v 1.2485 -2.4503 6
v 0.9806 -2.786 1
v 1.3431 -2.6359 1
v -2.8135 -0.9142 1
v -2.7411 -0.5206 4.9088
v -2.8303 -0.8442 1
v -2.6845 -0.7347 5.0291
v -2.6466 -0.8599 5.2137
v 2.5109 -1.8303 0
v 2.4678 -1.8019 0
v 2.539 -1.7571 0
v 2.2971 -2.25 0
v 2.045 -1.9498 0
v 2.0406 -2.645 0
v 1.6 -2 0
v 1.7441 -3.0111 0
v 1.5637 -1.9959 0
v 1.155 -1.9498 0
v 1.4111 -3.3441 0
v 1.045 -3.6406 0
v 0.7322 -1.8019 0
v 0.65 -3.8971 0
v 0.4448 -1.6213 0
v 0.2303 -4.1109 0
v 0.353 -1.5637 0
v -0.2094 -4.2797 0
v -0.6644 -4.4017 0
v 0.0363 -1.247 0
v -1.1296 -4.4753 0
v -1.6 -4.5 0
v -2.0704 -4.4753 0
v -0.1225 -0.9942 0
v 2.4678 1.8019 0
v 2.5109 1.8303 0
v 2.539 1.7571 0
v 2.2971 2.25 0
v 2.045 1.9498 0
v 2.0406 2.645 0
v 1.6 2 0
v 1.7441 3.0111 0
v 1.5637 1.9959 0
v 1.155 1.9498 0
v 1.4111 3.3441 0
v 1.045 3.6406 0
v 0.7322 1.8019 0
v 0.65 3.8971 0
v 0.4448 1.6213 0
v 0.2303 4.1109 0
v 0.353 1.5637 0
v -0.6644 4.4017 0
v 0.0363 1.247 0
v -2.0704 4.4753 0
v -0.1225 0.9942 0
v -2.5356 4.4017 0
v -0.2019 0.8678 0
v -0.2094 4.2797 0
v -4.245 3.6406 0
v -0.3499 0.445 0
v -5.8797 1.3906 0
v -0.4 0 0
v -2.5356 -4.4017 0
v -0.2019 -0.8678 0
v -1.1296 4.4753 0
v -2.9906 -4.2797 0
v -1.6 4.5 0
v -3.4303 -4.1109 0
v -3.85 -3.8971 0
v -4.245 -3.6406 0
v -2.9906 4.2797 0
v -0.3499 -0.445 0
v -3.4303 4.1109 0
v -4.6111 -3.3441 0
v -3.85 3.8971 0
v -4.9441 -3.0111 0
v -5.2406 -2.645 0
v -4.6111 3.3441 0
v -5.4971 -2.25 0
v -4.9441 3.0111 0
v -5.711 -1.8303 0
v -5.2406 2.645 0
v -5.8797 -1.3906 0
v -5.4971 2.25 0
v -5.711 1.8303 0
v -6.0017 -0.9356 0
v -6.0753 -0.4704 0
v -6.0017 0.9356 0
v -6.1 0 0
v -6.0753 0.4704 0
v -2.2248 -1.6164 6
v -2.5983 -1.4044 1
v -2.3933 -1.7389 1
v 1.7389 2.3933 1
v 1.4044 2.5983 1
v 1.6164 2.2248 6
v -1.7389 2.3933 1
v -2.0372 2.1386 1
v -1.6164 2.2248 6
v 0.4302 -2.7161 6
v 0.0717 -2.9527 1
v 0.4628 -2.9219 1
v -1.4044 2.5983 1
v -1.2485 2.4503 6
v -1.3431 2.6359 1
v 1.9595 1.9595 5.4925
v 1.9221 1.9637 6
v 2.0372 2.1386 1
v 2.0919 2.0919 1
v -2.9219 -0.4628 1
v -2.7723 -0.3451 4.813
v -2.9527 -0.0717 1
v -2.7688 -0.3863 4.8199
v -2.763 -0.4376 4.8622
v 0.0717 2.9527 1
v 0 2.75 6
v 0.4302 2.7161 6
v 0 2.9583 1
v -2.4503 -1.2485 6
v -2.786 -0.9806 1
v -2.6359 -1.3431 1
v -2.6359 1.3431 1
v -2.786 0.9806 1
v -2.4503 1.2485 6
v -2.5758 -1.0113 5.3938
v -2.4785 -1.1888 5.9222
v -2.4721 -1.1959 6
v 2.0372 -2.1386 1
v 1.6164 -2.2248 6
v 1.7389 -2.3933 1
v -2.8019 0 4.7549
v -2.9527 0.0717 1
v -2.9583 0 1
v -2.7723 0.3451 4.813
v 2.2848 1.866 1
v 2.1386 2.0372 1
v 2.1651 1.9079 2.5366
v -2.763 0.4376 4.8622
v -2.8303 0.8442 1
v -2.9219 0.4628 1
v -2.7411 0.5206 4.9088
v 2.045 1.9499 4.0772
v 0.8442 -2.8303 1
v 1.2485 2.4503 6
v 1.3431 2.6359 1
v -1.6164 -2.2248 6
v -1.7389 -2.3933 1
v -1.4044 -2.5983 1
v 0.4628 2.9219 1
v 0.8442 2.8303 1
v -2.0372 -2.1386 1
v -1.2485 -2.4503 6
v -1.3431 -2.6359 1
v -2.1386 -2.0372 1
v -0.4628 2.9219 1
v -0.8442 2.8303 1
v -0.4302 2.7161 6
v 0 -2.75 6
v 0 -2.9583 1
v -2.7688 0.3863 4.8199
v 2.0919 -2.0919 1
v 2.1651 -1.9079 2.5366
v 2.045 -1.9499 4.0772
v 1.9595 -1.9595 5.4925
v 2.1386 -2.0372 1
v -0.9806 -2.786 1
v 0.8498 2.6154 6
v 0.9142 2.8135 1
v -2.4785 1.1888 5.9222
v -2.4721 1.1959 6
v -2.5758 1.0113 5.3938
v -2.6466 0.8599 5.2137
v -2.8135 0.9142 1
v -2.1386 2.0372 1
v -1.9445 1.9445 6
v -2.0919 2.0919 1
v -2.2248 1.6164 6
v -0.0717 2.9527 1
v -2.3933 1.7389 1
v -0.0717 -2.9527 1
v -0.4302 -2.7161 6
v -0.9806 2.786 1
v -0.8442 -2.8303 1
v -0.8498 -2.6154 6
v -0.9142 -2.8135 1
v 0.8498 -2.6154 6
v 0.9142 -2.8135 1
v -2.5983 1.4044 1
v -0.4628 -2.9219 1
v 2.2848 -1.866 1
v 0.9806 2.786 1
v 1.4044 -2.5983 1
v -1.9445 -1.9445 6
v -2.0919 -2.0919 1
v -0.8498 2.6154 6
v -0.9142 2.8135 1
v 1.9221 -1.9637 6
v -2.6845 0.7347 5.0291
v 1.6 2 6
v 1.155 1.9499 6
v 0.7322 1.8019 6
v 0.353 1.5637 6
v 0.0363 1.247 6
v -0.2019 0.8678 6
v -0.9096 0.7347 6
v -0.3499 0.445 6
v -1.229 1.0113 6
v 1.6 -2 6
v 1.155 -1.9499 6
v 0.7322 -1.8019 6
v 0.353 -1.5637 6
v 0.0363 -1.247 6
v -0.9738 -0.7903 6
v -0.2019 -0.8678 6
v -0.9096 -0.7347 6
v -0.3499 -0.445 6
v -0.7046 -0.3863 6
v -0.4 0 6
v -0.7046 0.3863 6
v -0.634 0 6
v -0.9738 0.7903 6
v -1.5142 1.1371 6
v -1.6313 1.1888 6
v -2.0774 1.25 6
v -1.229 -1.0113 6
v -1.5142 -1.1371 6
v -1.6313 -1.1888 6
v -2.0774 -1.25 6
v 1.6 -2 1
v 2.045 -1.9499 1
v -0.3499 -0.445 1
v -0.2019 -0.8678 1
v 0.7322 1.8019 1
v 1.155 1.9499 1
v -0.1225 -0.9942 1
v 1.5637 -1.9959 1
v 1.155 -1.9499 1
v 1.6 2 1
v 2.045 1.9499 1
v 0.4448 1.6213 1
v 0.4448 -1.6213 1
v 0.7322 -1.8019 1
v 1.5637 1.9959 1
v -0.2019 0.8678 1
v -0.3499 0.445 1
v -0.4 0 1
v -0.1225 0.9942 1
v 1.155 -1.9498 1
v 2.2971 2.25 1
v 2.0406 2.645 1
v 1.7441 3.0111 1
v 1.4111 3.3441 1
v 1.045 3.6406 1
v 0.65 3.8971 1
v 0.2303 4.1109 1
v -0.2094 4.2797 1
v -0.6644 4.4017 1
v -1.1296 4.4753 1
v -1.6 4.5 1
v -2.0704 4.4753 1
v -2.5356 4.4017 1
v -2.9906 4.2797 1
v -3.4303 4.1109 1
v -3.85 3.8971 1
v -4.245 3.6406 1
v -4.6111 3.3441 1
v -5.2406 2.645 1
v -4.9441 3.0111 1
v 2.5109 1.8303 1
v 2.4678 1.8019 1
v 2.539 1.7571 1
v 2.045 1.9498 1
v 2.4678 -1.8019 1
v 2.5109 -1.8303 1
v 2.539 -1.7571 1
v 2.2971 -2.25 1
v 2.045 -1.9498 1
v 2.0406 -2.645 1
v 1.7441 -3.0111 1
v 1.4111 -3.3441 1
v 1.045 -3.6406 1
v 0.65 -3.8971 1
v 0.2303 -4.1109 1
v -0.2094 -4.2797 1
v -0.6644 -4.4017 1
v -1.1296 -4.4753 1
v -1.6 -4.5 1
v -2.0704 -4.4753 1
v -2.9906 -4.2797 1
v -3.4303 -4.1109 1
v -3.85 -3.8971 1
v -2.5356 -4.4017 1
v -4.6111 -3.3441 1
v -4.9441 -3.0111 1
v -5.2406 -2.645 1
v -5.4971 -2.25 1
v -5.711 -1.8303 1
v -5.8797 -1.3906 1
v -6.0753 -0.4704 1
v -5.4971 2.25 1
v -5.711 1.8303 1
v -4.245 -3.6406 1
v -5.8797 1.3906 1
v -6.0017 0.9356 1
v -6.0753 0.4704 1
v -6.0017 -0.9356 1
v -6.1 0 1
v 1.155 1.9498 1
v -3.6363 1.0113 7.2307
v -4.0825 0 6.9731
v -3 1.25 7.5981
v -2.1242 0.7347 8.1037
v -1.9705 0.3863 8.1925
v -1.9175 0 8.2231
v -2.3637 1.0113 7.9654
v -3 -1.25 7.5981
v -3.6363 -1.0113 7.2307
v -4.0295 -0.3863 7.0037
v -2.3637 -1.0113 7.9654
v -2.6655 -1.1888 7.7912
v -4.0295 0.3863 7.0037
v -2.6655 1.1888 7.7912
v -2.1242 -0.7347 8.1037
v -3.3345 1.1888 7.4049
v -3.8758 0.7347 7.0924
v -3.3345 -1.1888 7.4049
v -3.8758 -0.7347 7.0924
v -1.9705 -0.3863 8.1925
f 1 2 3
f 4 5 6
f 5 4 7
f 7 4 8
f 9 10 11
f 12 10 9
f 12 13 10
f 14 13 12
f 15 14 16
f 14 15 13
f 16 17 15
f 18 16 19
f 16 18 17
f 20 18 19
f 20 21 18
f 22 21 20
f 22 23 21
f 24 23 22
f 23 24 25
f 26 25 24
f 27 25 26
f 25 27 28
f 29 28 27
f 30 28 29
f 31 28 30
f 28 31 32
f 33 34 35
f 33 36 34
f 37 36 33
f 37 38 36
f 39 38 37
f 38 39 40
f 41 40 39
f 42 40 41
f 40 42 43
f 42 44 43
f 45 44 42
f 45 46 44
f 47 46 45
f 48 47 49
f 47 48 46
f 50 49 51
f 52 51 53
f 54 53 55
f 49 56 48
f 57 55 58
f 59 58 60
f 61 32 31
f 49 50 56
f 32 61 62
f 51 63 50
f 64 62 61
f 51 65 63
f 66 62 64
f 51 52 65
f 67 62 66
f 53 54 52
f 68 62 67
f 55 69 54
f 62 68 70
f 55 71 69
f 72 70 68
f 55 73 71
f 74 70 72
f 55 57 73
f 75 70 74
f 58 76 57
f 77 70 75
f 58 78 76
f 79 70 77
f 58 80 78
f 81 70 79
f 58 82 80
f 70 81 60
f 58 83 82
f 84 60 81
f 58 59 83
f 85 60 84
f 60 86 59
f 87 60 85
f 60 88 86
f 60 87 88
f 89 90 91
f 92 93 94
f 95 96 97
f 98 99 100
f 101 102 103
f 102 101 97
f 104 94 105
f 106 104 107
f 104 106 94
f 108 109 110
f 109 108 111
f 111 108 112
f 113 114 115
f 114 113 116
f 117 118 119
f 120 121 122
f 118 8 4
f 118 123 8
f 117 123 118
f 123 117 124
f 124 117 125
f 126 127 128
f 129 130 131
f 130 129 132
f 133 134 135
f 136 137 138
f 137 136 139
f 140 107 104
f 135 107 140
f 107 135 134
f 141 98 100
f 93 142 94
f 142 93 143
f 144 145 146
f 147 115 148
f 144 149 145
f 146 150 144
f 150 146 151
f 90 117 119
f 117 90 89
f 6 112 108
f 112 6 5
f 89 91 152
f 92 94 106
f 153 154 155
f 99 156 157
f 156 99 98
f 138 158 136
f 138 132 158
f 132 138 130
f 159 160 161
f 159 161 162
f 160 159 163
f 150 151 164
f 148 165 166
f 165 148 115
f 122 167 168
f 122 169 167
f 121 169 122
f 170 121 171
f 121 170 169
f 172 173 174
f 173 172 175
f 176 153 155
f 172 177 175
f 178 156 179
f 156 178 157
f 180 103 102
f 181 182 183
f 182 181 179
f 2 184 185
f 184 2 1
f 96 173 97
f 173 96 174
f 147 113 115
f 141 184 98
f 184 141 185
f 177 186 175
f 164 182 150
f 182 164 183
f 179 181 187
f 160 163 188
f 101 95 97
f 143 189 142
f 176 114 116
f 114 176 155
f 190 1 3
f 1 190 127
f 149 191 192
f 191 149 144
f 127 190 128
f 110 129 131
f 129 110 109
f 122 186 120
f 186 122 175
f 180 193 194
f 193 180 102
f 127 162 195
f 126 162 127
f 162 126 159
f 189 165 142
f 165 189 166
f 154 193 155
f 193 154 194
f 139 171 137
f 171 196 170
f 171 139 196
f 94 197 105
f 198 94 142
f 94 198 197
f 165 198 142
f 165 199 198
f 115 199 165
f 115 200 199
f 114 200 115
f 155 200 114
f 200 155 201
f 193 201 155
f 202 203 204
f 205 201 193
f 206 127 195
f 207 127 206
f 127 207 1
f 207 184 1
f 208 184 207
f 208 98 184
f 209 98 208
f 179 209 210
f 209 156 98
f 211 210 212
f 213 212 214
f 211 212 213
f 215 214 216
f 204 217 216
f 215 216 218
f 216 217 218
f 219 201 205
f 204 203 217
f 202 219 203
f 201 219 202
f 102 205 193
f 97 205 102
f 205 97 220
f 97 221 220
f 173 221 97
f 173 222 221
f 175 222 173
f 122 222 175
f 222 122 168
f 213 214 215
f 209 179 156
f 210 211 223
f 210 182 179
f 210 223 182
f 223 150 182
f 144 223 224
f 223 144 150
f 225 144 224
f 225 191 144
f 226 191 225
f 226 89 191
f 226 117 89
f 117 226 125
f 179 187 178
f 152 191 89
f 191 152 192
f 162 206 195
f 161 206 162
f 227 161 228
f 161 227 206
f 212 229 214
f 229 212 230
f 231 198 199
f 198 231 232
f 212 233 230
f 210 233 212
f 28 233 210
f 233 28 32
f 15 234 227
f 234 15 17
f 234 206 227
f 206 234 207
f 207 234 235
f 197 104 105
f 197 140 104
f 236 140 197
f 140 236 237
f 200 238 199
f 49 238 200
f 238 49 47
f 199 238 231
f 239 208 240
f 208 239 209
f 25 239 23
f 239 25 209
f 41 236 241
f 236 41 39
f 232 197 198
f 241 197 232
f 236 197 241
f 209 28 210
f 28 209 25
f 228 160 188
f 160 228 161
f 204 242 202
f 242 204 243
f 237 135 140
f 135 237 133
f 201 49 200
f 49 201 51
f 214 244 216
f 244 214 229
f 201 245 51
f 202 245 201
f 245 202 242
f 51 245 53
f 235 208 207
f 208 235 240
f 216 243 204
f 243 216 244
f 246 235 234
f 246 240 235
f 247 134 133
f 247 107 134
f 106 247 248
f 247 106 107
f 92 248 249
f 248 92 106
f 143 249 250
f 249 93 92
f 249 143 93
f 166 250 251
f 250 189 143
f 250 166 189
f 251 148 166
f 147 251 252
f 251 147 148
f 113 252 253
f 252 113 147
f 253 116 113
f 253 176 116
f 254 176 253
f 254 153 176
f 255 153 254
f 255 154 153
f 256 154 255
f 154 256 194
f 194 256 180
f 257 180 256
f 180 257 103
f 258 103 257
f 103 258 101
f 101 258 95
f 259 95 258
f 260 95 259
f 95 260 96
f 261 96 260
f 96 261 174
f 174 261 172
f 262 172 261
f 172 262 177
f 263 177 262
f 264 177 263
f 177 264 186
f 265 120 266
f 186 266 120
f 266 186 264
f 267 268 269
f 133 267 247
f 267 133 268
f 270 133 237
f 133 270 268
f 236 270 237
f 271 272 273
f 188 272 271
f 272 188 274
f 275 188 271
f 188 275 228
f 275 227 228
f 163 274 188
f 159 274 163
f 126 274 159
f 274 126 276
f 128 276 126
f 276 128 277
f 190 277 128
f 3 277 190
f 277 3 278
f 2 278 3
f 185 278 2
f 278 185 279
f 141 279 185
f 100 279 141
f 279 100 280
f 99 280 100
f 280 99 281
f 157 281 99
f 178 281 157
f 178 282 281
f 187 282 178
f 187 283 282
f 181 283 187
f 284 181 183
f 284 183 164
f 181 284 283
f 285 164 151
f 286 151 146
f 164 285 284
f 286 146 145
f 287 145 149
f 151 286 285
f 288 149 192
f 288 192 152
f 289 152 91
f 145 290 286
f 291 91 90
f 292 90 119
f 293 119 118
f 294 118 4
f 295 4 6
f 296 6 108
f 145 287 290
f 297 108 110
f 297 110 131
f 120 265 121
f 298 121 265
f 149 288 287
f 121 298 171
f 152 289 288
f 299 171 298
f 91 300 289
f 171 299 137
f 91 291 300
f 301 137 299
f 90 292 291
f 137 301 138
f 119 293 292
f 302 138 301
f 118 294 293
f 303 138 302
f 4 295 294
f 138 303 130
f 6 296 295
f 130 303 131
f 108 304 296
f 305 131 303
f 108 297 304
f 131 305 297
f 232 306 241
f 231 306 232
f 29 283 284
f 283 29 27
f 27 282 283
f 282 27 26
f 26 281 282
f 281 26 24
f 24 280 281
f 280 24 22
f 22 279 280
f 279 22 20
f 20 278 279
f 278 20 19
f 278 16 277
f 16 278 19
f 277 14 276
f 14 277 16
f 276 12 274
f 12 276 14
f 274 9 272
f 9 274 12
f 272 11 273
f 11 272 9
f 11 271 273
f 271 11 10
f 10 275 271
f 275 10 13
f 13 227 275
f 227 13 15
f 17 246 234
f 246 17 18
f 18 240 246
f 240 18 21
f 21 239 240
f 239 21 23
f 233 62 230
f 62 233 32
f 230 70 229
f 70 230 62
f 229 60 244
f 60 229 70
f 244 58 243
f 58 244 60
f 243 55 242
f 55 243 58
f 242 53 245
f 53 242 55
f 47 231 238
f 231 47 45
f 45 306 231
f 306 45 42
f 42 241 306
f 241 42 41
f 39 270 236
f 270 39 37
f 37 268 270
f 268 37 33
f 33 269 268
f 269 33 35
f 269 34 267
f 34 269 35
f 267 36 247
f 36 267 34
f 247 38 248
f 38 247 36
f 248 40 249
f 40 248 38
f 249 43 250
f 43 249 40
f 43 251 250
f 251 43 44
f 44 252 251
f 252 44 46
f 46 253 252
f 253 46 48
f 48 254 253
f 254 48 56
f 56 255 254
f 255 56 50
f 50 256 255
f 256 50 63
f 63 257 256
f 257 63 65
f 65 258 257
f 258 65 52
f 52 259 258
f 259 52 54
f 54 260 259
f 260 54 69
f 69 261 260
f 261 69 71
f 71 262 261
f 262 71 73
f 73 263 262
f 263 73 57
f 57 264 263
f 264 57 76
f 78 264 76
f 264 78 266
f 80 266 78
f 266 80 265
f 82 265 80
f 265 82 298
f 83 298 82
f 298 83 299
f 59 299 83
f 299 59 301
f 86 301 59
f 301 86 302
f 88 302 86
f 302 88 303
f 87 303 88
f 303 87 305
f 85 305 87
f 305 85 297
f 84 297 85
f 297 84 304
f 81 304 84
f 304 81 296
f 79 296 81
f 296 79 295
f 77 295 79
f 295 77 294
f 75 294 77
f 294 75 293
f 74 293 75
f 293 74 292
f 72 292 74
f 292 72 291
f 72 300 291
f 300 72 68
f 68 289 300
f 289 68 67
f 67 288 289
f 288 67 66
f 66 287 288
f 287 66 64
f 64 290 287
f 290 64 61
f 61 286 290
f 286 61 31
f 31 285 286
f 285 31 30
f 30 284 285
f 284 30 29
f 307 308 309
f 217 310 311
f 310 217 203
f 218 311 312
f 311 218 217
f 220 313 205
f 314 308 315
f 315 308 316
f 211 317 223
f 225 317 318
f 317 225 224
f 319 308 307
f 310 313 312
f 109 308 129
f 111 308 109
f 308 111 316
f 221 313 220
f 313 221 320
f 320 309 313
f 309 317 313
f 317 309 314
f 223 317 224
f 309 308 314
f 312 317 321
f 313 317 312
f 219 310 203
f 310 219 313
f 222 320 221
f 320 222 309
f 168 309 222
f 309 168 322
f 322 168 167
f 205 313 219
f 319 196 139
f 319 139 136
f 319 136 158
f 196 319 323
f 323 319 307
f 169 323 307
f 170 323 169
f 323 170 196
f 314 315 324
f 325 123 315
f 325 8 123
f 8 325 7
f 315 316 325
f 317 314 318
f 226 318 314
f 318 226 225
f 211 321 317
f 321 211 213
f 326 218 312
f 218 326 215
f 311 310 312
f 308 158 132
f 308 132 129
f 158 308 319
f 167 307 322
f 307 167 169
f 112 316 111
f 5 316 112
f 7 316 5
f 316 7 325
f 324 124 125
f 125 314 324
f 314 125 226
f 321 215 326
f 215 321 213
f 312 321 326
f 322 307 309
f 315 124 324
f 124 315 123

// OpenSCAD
difference() {
  cylinder(d1=6,d2=5.5,h=6,$fn=40);
  translate([1.6,0,-.01]) cylinder(d=4,h=6.02,$fn=28);
}
linear_extrude(1) difference() {
  translate([-1.6,0]) circle(d=9,$fn=60);
  translate([1.6,0]) circle(d=4,$fn=28);
}
translate([-1.5,0,5]) rotate([0,-30,0]) cylinder(d=2.5,h=3,$fn=20);
